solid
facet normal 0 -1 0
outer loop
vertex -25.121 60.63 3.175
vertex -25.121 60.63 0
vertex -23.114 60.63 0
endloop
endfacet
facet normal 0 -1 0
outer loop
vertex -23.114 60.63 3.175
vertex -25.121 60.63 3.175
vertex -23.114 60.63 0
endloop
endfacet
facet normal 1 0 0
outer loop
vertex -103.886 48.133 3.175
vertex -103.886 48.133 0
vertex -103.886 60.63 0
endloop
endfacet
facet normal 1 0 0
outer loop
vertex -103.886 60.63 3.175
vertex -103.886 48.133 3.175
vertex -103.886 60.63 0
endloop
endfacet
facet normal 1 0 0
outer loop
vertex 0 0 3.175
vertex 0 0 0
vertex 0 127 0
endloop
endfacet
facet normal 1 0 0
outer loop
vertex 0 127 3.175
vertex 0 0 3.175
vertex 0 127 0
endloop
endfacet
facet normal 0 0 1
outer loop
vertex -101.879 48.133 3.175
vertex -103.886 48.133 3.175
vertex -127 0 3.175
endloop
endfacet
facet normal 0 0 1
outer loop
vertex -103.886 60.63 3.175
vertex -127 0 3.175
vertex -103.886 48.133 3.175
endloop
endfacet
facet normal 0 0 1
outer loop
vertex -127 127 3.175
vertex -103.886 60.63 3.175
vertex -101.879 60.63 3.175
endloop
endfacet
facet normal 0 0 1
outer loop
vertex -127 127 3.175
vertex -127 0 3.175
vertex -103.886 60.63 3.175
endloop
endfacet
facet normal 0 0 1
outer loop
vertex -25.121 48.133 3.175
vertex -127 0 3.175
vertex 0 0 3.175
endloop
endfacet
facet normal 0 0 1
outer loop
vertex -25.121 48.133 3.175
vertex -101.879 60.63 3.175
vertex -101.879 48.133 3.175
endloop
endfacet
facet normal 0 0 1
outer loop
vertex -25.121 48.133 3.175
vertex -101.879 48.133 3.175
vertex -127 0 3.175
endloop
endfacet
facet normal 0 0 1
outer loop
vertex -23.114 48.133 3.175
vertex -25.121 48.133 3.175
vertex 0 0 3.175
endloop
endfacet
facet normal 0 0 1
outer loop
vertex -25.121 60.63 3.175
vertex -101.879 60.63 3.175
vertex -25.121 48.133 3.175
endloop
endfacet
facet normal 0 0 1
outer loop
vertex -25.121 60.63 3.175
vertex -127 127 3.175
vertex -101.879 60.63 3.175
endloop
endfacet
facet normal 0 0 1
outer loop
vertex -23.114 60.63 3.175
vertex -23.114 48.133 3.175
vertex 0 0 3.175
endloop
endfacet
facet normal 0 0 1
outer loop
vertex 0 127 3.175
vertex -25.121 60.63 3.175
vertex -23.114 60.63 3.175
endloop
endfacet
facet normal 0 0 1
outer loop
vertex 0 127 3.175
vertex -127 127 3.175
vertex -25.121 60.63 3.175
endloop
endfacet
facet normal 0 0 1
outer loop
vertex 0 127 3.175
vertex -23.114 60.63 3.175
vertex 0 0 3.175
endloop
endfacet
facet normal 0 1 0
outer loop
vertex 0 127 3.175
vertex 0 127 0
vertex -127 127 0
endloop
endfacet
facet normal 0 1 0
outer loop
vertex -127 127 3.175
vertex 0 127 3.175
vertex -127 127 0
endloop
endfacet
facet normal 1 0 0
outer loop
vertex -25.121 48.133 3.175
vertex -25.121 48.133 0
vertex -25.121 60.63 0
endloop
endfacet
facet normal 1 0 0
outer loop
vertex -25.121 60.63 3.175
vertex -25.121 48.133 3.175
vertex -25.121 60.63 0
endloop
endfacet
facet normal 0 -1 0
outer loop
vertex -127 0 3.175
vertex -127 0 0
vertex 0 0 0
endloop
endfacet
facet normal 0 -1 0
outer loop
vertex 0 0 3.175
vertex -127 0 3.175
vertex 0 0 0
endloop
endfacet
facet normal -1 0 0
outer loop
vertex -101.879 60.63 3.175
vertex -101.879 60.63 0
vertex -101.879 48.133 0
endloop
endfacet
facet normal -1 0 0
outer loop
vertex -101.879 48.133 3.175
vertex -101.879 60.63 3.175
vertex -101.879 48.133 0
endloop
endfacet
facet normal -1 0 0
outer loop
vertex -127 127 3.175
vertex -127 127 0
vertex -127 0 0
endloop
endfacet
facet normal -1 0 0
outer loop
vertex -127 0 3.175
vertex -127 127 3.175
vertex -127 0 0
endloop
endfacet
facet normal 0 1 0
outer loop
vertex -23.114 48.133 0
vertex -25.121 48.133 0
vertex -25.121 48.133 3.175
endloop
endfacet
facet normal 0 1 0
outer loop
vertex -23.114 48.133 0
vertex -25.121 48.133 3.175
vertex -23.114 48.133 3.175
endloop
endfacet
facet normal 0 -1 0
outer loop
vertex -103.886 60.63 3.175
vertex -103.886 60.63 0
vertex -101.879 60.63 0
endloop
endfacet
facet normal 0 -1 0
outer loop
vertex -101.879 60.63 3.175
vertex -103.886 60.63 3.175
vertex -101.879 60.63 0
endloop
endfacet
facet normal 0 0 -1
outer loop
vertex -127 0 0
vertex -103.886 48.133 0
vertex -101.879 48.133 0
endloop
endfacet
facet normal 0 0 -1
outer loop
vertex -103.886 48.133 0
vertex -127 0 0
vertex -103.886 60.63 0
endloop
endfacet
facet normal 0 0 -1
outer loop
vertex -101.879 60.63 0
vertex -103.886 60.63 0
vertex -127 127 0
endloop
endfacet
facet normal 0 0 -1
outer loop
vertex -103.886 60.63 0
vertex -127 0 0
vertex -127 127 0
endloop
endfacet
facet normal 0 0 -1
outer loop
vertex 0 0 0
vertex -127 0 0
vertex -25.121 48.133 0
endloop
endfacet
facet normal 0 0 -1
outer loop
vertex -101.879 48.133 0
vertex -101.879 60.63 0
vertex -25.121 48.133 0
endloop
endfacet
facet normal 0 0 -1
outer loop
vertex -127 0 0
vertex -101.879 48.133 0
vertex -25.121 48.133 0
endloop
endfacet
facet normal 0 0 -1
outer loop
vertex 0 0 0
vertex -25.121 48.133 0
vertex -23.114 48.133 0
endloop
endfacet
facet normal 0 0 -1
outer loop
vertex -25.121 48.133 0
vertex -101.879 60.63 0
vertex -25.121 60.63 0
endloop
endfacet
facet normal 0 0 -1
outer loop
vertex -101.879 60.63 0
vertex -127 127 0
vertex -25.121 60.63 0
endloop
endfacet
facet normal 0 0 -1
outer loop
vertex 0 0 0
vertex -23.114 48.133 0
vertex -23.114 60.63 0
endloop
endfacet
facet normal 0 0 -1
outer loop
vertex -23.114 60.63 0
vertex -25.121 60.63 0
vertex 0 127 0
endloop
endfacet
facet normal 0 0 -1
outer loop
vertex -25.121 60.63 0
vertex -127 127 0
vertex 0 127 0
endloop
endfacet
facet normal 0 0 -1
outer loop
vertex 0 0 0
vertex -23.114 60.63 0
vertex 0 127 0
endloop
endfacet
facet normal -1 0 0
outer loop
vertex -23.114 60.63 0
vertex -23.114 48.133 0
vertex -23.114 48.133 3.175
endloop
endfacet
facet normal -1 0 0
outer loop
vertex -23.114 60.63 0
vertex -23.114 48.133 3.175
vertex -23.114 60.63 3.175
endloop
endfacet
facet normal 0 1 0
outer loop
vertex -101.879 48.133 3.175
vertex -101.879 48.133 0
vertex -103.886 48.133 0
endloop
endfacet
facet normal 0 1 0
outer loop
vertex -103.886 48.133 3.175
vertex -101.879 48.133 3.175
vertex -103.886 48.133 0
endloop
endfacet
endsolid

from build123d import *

# Parameters (mm, degrees)
F0_W     = 2.0066
F0_H     = 12.4968
F0_W_2   = 19.05
F0_H_2   = 12.7
F0_H_3   = 1.27
F1_DEPTH = 3.175


# Not quite as in the source:
# - a length typed as a fraction of an inch, garbled in the dataset ("3 / 203.2 mm" for 3/8 in), is restored


with BuildPart() as f1:
    # F0 (on Top) → F1 (new body)
    with BuildSketch(Plane.XY):
        Polygon((-63.5, 0), (0, 0), (0, 127), (-63.5, 127), (-63.5, 13.97), (-44.45, 13.97), (-44.45, 12.7), (-63.5, 12.7), align=None)
        with Locations((-24.1173, 54.3814)):
            Rectangle(F0_W, F0_H, mode=Mode.SUBTRACT)
        Polygon((-95.25, 0), (-82.55, 0), (-82.55, 12.7), (-82.55, 13.97), (-63.5, 13.97), (-63.5, 127), (-127, 127), (-127, 54.3814), (-127, 0), align=None)
        Polygon((-103.886, 48.133), (-103.886, 54.3814), (-103.886, 60.6298), (-101.8794, 60.6298), (-101.8794, 48.133), align=None, mode=Mode.SUBTRACT)
        with Locations((-73.025, 6.35)):
            Rectangle(F0_W_2, F0_H_2)
        with Locations((-73.025, 13.335)):
            Rectangle(F0_W_2, F0_H_3)
        with Locations((-53.975, 13.335)):
            Rectangle(F0_W_2, F0_H_3)
    extrude(amount=F1_DEPTH)


solid = f1.part
